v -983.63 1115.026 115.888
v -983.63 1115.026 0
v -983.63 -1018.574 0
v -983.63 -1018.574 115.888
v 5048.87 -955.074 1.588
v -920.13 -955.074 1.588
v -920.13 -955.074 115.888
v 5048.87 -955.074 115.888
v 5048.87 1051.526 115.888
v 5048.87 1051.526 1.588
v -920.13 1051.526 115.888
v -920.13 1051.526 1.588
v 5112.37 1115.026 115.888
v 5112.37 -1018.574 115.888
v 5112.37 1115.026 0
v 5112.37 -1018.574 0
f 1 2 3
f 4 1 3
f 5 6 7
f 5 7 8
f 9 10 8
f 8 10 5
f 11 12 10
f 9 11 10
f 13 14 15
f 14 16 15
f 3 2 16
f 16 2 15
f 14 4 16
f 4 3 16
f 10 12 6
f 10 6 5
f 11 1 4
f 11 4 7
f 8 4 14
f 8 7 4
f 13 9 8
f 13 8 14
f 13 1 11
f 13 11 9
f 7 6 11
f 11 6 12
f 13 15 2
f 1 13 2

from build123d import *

# Parameters (mm, degrees)
F0_W     = 6096
F0_H     = 2133.6
F1_DEPTH = 1.5875
F2_W     = 63.5
F2_H     = 63.5
F2_W_2   = 5969
F2_H_2   = 2006.6
F3_DEPTH = 114.3


# Not quite as in the source:
# - a length typed as a fraction of an inch, garbled in the dataset ("3 / 203.2 mm" for 3/8 in), is restored


with BuildPart() as f1:
    # F0 (on Top) → F1 (new body)
    with BuildSketch(Plane.XY):
        with Locations((2064.3697643517, 48.2263118029)):
            Rectangle(F0_W, F0_H)
    extrude(amount=F1_DEPTH)

    # F2 (on face) → F3 (join)
    with BuildSketch(Plane.XY.offset(1.5875)):
        with Locations((5080.6197643517, 1083.2763118029)):
            Rectangle(F2_W, F2_H)
        with Locations((2064.3697643517, 1083.2763118029)):
            Rectangle(F2_W_2, F2_H)
        with Locations((5080.6197643517, 48.2263118029)):
            Rectangle(F2_W, F2_H_2)
        with Locations((-951.8802356483, 1083.2763118029)):
            Rectangle(F2_W, F2_H)
        with Locations((5080.6197643517, -986.8236881971)):
            Rectangle(F2_W, F2_H)
        with Locations((-951.8802356483, 48.2263118029)):
            Rectangle(F2_W, F2_H_2)
        with Locations((2064.3697643517, -986.8236881971)):
            Rectangle(F2_W_2, F2_H)
        with Locations((-951.8802356483, -986.8236881971)):
            Rectangle(F2_W, F2_H)
    extrude(amount=F3_DEPTH)


solid = f1.part
